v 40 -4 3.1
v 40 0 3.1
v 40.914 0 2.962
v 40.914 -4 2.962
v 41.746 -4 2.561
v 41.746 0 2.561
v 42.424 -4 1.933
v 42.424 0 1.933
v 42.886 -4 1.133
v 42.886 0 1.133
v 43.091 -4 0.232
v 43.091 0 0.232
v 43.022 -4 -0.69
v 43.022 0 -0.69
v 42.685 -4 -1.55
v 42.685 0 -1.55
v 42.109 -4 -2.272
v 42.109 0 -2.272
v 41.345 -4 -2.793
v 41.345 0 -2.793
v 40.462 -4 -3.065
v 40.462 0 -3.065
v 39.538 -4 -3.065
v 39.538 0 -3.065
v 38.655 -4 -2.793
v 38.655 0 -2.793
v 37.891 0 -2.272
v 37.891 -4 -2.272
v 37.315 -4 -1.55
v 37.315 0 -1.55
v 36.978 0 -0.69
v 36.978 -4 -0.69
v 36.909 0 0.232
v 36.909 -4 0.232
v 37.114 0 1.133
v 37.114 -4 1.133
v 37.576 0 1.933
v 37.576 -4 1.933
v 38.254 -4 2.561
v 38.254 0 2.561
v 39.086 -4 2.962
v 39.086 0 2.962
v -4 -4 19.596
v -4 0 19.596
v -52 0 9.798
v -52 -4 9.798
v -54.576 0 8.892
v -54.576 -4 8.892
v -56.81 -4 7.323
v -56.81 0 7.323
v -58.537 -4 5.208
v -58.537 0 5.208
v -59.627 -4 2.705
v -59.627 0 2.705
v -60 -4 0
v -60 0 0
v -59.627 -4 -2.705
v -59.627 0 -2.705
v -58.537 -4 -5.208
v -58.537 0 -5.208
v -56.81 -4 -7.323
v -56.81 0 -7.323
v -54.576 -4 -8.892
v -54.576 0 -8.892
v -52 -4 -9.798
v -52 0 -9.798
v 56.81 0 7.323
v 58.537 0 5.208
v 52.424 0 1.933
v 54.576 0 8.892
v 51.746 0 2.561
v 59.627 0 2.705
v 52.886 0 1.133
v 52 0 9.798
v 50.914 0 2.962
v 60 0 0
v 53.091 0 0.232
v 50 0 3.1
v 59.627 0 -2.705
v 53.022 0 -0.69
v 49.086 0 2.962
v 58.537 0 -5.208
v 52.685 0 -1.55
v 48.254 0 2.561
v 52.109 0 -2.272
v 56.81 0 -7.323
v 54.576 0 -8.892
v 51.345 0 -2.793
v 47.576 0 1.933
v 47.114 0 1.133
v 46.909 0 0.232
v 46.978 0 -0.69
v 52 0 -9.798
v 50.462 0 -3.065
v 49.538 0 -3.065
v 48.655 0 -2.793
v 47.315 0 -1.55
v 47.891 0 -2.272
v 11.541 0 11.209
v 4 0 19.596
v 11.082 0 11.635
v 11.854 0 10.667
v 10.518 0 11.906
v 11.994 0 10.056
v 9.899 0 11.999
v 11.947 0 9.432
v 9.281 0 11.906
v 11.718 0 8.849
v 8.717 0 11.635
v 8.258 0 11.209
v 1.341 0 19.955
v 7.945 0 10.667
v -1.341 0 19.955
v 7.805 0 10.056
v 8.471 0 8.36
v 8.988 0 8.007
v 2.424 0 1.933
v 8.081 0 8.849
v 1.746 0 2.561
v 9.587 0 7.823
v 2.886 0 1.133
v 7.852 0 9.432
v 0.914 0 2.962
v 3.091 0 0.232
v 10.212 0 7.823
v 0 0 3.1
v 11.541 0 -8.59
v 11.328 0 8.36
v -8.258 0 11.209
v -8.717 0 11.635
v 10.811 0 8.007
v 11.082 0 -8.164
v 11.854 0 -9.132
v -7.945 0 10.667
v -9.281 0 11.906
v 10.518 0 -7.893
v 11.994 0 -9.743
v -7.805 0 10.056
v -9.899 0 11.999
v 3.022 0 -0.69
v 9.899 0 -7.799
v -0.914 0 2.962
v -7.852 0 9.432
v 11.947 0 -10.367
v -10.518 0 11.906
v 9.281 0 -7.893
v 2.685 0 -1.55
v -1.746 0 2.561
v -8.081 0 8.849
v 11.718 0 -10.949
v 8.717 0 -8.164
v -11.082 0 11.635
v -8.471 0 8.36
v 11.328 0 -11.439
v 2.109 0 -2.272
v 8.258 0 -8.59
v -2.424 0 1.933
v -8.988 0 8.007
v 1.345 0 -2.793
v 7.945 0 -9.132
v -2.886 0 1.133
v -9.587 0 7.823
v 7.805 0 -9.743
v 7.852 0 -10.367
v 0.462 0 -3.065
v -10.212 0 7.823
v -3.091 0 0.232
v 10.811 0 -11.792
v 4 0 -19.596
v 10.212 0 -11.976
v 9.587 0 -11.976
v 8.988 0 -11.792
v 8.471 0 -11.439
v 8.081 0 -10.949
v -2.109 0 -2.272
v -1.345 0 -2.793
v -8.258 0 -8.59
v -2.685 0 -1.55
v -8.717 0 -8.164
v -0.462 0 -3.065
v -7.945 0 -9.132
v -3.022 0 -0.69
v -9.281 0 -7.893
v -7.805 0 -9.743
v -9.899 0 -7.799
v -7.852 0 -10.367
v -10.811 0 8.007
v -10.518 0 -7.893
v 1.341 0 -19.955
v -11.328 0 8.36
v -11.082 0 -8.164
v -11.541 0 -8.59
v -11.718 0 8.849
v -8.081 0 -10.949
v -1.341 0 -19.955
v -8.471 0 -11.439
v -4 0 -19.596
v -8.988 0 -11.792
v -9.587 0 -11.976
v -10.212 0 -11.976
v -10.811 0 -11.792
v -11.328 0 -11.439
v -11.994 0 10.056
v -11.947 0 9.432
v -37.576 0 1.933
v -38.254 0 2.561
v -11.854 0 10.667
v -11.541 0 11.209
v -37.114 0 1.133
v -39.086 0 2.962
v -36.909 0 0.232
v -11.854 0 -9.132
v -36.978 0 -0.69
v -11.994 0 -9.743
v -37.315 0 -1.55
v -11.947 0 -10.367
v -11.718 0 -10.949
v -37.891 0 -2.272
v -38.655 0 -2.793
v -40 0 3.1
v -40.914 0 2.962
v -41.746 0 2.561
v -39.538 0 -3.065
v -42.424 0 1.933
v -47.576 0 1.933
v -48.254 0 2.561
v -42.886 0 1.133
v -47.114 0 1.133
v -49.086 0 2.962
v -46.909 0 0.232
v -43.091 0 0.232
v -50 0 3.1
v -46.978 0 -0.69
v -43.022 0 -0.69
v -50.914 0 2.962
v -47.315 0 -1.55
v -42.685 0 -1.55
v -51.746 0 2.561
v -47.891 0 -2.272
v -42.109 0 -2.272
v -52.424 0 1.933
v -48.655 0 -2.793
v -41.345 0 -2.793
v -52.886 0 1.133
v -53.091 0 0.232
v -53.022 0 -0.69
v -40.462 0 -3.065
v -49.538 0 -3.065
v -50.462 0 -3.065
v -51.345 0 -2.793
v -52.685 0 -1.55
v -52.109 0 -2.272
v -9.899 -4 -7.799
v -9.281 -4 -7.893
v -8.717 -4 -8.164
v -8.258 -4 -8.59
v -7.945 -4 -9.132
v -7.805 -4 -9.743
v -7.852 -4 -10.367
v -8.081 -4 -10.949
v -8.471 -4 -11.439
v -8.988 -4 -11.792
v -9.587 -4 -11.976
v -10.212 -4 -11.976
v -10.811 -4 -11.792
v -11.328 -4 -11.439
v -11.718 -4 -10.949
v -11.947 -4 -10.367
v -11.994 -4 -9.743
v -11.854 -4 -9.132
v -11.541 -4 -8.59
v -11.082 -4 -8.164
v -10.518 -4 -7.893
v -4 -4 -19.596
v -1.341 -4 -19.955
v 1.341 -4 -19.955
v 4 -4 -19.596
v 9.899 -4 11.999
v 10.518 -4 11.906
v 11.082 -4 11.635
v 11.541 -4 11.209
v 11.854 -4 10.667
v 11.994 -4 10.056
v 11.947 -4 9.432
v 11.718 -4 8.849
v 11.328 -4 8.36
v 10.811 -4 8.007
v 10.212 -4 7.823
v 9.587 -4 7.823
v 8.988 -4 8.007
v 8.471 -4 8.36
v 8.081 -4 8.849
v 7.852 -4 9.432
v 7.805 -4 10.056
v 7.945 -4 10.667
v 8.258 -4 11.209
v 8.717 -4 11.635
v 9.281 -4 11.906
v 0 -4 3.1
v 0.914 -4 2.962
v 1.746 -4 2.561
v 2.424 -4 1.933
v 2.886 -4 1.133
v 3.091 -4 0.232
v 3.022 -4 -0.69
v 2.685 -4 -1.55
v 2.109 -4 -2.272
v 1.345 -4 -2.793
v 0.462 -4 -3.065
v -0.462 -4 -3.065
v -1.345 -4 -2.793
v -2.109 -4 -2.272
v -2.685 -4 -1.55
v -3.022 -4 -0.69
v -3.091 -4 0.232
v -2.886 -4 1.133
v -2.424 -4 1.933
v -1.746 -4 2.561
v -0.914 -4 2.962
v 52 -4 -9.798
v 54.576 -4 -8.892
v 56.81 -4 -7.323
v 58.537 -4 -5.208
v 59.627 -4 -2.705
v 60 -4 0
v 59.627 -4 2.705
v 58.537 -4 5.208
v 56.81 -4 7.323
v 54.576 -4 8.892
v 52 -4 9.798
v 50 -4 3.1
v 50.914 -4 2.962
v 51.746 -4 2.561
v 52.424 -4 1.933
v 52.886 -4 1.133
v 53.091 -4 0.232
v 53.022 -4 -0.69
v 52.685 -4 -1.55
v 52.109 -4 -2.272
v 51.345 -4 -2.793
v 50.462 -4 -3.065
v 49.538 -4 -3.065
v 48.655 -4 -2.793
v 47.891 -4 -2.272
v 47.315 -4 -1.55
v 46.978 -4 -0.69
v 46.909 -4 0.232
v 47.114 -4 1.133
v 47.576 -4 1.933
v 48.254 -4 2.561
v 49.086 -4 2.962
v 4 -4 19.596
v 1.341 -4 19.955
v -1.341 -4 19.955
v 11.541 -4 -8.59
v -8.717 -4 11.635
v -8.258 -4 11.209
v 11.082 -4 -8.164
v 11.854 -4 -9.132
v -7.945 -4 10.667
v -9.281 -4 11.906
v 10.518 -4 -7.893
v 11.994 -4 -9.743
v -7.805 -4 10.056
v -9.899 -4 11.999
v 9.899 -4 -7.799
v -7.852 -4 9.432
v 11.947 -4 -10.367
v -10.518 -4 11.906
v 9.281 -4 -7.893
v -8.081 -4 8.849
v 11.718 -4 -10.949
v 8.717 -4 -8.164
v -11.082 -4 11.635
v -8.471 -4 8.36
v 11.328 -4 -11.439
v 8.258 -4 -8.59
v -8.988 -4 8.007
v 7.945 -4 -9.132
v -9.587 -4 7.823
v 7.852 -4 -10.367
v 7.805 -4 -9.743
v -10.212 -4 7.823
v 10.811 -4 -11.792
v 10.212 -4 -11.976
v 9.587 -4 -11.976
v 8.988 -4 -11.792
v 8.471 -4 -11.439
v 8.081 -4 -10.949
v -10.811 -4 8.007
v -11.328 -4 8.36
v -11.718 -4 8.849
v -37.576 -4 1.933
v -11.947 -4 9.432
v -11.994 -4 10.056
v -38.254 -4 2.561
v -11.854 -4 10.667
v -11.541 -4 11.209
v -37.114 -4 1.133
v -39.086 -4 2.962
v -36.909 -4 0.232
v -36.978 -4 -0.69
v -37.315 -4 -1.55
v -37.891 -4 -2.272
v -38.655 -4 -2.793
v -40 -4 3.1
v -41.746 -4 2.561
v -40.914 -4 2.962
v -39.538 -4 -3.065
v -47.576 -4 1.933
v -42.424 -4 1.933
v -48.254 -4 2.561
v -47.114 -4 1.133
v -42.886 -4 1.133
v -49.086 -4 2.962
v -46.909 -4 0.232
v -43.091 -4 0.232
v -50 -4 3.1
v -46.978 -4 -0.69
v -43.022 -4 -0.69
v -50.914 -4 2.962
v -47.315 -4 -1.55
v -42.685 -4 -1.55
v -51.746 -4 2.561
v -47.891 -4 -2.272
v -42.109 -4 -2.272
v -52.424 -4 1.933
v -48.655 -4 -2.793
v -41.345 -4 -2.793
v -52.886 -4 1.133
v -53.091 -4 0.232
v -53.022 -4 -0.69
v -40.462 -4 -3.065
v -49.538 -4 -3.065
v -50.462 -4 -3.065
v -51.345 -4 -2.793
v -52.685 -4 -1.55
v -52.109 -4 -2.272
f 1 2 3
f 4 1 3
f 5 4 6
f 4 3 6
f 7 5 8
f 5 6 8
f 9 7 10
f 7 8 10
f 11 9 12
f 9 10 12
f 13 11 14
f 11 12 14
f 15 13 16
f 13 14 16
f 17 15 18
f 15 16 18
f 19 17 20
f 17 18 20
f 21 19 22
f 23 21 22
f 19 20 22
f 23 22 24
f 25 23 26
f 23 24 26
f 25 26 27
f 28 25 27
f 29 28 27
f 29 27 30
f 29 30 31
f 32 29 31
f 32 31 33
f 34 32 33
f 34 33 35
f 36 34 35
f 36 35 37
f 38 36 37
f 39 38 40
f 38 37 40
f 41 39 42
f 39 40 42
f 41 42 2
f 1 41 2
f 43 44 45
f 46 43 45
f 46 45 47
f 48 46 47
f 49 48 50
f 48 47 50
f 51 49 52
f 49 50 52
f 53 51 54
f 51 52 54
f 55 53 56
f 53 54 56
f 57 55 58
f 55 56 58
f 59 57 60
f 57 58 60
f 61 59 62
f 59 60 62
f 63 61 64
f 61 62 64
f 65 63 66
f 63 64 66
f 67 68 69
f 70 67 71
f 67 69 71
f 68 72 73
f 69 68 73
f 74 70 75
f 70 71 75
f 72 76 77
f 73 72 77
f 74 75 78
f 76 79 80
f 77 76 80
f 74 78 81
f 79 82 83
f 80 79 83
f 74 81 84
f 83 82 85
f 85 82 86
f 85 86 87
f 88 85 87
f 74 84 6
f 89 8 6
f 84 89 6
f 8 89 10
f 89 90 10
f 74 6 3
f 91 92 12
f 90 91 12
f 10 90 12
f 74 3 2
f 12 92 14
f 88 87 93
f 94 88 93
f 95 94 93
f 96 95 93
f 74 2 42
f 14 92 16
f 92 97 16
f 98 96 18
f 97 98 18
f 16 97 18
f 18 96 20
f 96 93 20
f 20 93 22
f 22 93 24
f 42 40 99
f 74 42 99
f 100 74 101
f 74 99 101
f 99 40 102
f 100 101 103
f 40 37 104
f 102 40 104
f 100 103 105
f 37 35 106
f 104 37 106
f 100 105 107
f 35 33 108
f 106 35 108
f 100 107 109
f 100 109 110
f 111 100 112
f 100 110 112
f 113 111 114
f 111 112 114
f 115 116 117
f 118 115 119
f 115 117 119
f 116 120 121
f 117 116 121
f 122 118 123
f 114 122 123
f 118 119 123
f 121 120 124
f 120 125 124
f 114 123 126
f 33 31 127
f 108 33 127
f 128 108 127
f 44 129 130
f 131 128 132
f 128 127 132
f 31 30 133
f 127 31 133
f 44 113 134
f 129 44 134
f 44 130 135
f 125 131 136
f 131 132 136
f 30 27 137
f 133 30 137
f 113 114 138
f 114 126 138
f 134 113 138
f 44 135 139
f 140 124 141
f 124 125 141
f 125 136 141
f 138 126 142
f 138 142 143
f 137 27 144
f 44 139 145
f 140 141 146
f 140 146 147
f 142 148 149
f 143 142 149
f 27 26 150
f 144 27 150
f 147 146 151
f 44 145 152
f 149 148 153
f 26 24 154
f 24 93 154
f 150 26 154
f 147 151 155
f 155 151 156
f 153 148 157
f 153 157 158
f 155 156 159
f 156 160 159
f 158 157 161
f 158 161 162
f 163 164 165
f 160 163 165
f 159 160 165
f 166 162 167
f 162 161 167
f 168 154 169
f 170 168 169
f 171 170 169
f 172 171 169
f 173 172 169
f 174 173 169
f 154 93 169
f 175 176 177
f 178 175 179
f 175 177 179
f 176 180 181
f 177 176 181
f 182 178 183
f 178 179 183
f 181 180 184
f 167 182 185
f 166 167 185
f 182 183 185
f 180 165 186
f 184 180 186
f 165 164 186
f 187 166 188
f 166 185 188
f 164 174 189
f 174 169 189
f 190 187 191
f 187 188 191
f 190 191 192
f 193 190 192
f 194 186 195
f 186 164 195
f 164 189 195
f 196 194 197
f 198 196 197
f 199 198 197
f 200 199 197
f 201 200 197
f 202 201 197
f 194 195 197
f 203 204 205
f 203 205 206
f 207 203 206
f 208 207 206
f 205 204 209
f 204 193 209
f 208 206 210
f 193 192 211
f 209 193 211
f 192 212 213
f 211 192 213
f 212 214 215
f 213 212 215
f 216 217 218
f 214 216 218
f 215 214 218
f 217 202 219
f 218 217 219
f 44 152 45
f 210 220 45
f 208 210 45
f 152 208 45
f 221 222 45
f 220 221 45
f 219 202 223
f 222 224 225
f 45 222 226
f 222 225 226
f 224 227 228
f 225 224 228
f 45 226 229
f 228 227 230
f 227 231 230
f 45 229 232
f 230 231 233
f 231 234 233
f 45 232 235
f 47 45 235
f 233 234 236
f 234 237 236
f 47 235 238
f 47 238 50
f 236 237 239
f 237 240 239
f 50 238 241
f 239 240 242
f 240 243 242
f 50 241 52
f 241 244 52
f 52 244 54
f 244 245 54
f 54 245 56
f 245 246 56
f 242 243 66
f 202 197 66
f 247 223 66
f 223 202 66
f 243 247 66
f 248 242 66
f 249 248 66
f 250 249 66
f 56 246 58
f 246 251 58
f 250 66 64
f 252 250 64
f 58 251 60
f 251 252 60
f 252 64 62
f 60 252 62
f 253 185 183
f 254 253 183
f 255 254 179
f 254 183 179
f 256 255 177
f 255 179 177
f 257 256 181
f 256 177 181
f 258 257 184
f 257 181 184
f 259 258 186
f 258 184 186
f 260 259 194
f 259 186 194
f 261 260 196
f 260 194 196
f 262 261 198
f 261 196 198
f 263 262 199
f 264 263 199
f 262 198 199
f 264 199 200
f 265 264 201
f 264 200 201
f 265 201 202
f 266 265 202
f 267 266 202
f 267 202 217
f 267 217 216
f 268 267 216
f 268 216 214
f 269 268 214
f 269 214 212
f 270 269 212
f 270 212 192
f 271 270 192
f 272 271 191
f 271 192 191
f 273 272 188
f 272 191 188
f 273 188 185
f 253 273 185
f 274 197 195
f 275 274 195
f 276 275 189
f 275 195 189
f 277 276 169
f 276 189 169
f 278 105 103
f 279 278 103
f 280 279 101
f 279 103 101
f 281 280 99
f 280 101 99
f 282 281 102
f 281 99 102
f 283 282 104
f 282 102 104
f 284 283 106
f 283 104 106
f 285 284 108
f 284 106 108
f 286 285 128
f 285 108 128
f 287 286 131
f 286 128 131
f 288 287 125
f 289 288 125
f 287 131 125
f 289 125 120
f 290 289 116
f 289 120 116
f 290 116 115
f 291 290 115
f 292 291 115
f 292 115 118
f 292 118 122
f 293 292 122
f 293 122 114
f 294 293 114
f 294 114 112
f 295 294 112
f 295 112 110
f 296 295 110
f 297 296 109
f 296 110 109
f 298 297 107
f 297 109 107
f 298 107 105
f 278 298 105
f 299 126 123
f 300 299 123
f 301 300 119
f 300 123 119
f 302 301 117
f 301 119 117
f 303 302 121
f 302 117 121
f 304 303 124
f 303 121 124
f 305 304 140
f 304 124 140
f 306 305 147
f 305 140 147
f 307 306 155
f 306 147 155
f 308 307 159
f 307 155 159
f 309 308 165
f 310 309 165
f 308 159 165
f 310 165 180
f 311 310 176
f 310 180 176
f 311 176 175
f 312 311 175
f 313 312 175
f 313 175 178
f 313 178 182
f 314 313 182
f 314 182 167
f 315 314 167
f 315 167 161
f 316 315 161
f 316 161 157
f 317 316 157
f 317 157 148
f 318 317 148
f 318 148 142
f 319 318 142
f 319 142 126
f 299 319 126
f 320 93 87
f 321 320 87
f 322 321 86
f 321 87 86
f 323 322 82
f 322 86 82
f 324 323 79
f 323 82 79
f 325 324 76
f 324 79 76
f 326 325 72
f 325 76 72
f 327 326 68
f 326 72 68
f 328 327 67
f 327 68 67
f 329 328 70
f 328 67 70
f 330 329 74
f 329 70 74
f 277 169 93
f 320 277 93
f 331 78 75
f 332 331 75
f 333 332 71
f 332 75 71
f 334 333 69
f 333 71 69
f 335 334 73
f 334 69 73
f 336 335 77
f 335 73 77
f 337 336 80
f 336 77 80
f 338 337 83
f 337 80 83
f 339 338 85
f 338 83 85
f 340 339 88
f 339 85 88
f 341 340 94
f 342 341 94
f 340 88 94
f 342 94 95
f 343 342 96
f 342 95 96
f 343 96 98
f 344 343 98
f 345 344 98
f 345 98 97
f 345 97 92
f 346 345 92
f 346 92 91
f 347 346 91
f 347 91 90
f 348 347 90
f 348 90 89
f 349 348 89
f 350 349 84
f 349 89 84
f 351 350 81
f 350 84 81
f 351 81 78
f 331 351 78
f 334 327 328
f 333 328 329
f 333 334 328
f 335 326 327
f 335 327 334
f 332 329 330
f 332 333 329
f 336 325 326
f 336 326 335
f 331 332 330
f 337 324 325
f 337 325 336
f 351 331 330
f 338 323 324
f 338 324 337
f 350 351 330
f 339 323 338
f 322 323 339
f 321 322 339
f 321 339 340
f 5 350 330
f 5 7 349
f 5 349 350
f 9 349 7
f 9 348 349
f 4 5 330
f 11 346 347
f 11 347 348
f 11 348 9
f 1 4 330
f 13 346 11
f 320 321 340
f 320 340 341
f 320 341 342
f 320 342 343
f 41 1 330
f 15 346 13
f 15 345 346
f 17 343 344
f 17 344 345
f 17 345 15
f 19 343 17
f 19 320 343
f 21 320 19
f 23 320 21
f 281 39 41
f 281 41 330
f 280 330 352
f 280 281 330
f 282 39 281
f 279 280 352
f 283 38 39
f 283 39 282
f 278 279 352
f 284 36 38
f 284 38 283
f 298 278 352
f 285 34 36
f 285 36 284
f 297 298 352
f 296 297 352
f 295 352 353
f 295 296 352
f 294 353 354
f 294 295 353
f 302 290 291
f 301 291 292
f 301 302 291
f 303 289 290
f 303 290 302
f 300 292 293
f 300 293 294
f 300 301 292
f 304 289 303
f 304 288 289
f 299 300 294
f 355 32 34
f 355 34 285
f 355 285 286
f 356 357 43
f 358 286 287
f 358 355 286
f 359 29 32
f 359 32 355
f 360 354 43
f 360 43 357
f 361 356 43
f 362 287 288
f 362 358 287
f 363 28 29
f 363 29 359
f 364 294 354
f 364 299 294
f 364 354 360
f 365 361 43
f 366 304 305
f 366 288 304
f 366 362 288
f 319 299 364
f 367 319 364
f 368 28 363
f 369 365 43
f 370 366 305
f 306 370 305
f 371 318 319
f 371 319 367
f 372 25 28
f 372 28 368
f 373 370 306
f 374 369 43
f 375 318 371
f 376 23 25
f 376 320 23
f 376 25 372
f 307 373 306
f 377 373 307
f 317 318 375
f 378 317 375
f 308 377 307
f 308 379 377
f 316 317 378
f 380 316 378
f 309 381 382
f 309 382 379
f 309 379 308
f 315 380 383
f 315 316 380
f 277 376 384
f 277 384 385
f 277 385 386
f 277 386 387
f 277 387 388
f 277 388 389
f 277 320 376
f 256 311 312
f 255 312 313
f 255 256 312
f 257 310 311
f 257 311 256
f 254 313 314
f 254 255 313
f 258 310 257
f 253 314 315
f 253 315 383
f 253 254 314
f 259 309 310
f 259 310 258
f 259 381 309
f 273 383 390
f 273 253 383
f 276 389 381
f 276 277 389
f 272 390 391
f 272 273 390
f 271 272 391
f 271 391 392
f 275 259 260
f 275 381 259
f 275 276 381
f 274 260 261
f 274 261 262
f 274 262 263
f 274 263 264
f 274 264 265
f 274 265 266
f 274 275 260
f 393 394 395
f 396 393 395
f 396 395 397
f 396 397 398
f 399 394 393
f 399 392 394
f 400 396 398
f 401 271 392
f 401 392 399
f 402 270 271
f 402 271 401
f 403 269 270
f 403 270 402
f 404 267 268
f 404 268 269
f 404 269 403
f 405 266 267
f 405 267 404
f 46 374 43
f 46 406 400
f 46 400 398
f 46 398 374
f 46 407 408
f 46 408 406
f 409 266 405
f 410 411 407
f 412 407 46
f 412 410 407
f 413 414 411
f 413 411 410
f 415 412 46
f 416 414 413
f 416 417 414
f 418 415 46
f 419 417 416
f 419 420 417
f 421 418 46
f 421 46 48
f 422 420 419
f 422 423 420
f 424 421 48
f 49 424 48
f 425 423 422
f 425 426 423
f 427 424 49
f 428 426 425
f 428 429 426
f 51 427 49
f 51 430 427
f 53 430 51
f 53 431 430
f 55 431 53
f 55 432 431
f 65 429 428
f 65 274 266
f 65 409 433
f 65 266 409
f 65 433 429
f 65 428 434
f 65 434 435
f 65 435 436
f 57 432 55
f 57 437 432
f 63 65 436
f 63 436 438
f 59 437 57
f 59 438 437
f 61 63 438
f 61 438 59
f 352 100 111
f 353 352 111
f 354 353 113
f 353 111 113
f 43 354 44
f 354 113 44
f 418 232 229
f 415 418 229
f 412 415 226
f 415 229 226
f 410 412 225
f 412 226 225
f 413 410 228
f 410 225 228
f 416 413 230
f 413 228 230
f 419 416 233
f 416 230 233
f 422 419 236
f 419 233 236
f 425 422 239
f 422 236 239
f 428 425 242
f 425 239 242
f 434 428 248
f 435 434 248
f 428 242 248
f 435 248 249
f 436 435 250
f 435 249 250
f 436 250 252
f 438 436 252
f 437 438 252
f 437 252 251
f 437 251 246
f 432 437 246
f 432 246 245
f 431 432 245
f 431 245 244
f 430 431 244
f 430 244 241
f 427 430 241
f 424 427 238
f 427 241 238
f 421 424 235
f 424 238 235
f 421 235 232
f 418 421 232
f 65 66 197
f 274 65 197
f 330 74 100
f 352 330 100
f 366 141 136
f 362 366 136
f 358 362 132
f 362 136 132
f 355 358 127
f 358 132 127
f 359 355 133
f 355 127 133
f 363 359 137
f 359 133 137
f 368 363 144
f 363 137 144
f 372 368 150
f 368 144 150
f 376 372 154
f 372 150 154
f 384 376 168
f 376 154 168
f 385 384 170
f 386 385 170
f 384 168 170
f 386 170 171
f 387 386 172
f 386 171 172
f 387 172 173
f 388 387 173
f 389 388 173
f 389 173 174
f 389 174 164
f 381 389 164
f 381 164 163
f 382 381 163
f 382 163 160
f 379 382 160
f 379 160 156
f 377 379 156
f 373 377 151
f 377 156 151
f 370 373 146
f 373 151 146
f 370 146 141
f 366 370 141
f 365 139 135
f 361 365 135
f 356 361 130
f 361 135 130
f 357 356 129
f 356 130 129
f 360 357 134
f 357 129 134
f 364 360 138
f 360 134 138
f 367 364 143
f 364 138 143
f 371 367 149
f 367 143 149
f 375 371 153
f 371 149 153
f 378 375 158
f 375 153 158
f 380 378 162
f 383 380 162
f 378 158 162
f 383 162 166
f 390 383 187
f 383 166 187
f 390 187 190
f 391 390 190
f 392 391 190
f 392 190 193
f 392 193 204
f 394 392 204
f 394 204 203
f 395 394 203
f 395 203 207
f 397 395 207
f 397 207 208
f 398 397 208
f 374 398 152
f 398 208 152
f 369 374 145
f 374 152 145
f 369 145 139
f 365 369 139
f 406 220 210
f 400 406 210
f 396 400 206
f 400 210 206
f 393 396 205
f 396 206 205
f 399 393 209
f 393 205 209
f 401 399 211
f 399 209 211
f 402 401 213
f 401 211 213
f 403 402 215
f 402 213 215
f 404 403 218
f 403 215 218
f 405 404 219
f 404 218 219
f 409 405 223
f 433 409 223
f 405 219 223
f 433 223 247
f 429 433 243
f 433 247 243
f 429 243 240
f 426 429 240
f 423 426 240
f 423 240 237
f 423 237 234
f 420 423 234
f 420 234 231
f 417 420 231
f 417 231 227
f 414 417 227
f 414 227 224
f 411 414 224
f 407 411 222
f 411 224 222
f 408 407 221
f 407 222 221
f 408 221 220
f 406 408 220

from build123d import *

# Parameters (mm, degrees)
SKETCH_1_R             = 2.1
SKETCH_1_R_2           = 3.1
SM_BASE_FLANGE_1_DEPTH = 4
SKETCH_6_R             = 3.1
CUT_EXTRUDE_1_DEPTH    = 10


# Sheet-metal steps are written as plain solids
with BuildPart() as part:
    # Sketch 1 → Базовая кромка1 (new body)
    with BuildSketch(Plane(origin=(0, 0, 0), x_dir=(1, 0, 0), z_dir=(0, 1, 0))):
        with BuildLine():
            Line((-52, 9.797958971), (-4, 19.595917942))
            ThreePointArc((-4, 19.595917942), (0, 20), (4, 19.595917942))
            Line((4, 19.595917942), (52, 9.797958971))
            ThreePointArc((52, 9.797958971), (60, 0), (52, -9.797958971))
            Line((52, -9.797958971), (4, -19.595917942))
            ThreePointArc((4, -19.595917942), (0, -20), (-4, -19.595917942))
            Line((-4, -19.595917942), (-52, -9.797958971))
            ThreePointArc((-52, -9.797958971), (-60, 0), (-52, 9.797958971))
        make_face()
        with Locations(Location((9.899494937, 9.899494937, 0), (0, 0, 270))):
            Circle(SKETCH_1_R, mode=Mode.SUBTRACT)
        with Locations(Location((9.899494937, -9.899494937, 0), (0, 0, 270))):
            Circle(SKETCH_1_R, mode=Mode.SUBTRACT)
        with Locations(Location((-9.899494937, -9.899494937, 0), (0, 0, 270))):
            Circle(SKETCH_1_R, mode=Mode.SUBTRACT)
        with Locations(Location((-9.899494937, 9.899494937, 0), (0, 0, 270))):
            Circle(SKETCH_1_R, mode=Mode.SUBTRACT)
        with Locations(Location((50, 0, 0), (0, 0, 270))):
            Circle(SKETCH_1_R_2, mode=Mode.SUBTRACT)
        with Locations(Location((-50, 0, 0), (0, 0, 270))):
            Circle(SKETCH_1_R_2, mode=Mode.SUBTRACT)
        with Locations(Location((-40, 0, 0), (0, 0, 270))):
            Circle(SKETCH_1_R_2, mode=Mode.SUBTRACT)
        with Locations(Location((40, 0, 0), (0, 0, 270))):
            Circle(SKETCH_1_R_2, mode=Mode.SUBTRACT)
    extrude(amount=-SM_BASE_FLANGE_1_DEPTH)

    # Эскиз6 → Вырез-Вытянуть1 (cut)
    with BuildSketch(Plane(origin=(0, 0, 0), x_dir=(1, 0, 0), z_dir=(0, 1, 0))):
        with Locations(Location((0, 0, 0), (0, 0, 270))):
            Circle(SKETCH_6_R)
    extrude(amount=-CUT_EXTRUDE_1_DEPTH, mode=Mode.SUBTRACT)


solid = part.part
